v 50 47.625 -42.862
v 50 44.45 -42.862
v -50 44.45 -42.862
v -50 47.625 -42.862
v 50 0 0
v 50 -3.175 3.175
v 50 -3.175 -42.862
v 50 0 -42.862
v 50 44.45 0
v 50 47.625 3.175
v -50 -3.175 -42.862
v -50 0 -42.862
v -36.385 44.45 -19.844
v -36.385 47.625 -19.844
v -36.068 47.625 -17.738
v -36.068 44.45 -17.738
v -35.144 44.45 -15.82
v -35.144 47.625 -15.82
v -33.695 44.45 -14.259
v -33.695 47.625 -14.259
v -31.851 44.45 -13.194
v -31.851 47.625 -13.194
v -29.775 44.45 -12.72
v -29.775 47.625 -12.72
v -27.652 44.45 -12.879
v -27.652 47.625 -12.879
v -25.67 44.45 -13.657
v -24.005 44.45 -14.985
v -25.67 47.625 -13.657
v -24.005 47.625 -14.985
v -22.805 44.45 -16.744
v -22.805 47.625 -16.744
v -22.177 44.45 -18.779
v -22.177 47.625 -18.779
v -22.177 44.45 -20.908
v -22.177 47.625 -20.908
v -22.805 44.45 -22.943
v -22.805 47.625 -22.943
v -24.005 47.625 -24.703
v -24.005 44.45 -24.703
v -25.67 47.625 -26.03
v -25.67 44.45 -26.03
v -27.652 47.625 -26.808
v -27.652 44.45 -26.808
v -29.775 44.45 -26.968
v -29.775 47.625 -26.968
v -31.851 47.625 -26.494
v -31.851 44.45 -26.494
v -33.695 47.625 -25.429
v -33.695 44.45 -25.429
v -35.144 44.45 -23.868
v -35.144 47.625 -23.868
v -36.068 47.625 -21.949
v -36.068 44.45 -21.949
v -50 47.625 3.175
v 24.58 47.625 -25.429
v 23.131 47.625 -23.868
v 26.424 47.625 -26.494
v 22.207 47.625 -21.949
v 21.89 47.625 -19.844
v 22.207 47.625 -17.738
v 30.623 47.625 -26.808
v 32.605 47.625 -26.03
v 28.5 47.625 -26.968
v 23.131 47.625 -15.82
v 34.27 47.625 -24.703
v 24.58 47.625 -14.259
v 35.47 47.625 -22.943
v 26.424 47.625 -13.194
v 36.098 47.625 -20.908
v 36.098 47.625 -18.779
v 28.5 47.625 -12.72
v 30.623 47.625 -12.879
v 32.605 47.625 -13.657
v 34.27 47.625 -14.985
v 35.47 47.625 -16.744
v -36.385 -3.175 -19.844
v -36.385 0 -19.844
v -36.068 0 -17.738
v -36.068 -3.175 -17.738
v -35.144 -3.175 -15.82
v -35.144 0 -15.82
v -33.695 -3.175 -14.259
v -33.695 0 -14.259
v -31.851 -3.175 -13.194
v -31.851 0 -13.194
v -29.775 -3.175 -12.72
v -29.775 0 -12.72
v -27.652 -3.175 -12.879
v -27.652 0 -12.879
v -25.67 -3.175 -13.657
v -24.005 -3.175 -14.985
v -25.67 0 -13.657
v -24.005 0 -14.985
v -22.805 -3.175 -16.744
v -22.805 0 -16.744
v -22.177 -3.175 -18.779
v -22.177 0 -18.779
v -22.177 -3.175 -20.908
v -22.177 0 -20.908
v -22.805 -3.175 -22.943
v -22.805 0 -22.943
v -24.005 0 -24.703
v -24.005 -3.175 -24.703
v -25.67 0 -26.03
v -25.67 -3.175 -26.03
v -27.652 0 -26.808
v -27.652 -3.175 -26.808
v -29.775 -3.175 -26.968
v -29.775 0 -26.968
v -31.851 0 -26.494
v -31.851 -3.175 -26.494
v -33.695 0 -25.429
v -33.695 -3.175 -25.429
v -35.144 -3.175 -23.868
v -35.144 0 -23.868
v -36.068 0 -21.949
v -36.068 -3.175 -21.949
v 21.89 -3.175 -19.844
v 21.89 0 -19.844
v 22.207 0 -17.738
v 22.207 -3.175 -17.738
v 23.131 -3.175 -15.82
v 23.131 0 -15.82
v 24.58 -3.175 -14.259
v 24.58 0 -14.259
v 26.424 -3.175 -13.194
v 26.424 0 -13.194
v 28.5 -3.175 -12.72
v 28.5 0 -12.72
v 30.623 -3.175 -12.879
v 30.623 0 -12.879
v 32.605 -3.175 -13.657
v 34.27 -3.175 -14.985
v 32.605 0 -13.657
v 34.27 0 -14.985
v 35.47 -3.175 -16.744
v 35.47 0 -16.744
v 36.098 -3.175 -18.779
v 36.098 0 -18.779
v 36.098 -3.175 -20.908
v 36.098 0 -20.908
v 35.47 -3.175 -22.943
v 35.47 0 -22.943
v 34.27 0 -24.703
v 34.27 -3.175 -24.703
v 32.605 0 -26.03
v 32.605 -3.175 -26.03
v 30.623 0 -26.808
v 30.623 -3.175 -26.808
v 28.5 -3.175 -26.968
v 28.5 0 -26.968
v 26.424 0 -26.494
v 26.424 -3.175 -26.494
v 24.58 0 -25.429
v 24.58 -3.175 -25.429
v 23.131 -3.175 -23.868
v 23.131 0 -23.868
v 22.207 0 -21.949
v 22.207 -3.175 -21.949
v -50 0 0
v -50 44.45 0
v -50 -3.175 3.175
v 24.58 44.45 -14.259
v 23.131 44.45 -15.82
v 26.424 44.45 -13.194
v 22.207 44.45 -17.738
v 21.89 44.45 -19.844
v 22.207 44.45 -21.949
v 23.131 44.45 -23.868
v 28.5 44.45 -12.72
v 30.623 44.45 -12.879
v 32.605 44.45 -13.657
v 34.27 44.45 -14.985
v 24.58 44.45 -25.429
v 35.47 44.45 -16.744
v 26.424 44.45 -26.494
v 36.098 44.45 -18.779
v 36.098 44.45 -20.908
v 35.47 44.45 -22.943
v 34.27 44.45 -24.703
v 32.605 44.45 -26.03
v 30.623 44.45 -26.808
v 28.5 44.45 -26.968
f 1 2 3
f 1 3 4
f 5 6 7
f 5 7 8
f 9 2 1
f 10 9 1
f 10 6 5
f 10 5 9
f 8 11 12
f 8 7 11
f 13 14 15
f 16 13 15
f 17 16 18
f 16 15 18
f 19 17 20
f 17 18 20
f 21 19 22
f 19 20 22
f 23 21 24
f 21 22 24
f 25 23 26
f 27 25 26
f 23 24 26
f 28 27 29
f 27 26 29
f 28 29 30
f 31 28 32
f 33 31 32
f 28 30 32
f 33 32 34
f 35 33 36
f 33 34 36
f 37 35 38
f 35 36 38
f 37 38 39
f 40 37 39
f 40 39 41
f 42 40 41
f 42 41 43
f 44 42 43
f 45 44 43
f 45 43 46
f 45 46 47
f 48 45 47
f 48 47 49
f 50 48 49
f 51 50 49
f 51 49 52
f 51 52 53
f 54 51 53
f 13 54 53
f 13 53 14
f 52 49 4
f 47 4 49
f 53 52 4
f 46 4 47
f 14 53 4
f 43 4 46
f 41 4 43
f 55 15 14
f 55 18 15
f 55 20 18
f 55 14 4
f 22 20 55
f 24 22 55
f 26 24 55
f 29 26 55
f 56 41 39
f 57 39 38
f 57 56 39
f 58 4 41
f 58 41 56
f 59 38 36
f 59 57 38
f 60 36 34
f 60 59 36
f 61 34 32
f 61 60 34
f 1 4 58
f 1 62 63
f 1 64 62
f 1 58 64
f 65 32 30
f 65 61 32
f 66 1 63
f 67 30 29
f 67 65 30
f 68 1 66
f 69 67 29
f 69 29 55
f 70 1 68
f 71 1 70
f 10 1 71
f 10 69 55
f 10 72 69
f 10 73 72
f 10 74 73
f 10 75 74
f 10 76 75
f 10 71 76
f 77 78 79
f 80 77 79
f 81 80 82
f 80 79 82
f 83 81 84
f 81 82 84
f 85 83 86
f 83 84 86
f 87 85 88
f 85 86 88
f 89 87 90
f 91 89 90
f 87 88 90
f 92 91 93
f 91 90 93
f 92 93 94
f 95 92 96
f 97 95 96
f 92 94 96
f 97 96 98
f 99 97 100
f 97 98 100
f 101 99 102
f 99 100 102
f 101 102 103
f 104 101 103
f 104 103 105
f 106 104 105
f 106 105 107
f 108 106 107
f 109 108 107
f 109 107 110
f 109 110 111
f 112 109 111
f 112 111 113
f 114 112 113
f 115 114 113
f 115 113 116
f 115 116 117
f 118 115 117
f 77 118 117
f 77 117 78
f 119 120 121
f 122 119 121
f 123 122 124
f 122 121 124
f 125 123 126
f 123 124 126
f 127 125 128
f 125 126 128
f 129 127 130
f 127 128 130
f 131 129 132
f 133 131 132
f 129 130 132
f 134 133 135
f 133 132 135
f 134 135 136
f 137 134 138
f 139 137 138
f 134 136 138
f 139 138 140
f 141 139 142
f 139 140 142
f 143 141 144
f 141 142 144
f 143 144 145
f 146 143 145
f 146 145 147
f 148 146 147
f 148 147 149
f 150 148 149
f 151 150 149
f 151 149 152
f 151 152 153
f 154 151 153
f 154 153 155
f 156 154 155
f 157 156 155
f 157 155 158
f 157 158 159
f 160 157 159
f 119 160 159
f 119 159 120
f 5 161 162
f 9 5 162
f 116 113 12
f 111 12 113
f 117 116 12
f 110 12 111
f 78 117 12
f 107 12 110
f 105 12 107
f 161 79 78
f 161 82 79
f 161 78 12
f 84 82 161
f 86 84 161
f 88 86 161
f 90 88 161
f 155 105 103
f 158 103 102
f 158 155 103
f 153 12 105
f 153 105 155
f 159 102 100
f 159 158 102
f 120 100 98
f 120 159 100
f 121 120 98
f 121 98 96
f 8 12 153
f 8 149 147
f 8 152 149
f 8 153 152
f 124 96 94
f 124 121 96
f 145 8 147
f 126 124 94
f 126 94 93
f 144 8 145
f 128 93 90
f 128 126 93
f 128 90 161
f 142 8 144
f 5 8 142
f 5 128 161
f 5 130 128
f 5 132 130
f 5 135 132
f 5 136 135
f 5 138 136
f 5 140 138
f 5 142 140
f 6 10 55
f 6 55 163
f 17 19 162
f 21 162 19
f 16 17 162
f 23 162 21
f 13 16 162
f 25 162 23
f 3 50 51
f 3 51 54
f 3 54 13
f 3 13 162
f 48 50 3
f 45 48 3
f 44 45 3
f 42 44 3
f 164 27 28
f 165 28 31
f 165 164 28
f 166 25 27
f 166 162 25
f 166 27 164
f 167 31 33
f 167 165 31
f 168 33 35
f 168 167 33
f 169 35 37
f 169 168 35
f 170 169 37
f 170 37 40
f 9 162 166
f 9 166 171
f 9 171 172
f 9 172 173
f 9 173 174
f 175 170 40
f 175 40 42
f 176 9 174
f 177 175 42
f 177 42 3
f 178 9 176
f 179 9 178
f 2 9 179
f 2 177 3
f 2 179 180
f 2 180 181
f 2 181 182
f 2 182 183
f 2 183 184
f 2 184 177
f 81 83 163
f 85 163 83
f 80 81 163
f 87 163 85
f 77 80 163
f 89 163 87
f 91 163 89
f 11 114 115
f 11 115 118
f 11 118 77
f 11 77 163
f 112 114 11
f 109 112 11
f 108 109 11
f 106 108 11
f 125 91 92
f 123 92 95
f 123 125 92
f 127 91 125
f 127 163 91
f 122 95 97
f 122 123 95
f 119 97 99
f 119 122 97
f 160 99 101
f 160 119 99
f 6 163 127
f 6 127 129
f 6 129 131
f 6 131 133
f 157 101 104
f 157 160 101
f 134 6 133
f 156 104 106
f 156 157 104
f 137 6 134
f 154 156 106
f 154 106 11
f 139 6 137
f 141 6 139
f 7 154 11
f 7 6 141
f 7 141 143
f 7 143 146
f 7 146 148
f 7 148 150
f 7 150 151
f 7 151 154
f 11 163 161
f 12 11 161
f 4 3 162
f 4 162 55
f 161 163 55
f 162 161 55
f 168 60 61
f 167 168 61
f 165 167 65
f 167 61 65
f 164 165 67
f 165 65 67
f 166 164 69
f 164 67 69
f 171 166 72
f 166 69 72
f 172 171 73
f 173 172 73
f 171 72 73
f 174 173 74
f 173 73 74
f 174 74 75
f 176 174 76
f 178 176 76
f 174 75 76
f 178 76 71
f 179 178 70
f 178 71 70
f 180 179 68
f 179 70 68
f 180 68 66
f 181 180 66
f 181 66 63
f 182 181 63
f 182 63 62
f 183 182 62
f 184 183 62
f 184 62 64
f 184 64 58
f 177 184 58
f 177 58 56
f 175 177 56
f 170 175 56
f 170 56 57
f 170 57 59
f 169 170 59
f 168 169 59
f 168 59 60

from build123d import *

# Parameters (mm, degrees)
F1_DEPTH = 50
F2_R     = 7.14375
F3_DEPTH = 50.801


with BuildPart() as f1:
    # F0 (on Right) → F1 (new body, symmetric)
    with BuildSketch(Plane.YZ):
        Polygon((0, -42.8625), (0, 0), (44.45, 0), (44.45, -42.8625), (47.625, -42.8625), (47.625, 3.175), (-3.175, 3.175), (-3.175, -42.8625), align=None)
    extrude(amount=F1_DEPTH, both=True)

    # F2 (on face) → F3 (cut, through all)
    with BuildSketch(Plane(origin=(0, 47.625, 0), x_dir=(-1, 0, 0), z_dir=(0, 1, 0))):
        with Locations((-29.0336, -19.84375)):
            Circle(F2_R)
        with Locations((29.2414, -19.84375)):
            Circle(F2_R)
    extrude(amount=-F3_DEPTH, mode=Mode.SUBTRACT)


solid = f1.part
